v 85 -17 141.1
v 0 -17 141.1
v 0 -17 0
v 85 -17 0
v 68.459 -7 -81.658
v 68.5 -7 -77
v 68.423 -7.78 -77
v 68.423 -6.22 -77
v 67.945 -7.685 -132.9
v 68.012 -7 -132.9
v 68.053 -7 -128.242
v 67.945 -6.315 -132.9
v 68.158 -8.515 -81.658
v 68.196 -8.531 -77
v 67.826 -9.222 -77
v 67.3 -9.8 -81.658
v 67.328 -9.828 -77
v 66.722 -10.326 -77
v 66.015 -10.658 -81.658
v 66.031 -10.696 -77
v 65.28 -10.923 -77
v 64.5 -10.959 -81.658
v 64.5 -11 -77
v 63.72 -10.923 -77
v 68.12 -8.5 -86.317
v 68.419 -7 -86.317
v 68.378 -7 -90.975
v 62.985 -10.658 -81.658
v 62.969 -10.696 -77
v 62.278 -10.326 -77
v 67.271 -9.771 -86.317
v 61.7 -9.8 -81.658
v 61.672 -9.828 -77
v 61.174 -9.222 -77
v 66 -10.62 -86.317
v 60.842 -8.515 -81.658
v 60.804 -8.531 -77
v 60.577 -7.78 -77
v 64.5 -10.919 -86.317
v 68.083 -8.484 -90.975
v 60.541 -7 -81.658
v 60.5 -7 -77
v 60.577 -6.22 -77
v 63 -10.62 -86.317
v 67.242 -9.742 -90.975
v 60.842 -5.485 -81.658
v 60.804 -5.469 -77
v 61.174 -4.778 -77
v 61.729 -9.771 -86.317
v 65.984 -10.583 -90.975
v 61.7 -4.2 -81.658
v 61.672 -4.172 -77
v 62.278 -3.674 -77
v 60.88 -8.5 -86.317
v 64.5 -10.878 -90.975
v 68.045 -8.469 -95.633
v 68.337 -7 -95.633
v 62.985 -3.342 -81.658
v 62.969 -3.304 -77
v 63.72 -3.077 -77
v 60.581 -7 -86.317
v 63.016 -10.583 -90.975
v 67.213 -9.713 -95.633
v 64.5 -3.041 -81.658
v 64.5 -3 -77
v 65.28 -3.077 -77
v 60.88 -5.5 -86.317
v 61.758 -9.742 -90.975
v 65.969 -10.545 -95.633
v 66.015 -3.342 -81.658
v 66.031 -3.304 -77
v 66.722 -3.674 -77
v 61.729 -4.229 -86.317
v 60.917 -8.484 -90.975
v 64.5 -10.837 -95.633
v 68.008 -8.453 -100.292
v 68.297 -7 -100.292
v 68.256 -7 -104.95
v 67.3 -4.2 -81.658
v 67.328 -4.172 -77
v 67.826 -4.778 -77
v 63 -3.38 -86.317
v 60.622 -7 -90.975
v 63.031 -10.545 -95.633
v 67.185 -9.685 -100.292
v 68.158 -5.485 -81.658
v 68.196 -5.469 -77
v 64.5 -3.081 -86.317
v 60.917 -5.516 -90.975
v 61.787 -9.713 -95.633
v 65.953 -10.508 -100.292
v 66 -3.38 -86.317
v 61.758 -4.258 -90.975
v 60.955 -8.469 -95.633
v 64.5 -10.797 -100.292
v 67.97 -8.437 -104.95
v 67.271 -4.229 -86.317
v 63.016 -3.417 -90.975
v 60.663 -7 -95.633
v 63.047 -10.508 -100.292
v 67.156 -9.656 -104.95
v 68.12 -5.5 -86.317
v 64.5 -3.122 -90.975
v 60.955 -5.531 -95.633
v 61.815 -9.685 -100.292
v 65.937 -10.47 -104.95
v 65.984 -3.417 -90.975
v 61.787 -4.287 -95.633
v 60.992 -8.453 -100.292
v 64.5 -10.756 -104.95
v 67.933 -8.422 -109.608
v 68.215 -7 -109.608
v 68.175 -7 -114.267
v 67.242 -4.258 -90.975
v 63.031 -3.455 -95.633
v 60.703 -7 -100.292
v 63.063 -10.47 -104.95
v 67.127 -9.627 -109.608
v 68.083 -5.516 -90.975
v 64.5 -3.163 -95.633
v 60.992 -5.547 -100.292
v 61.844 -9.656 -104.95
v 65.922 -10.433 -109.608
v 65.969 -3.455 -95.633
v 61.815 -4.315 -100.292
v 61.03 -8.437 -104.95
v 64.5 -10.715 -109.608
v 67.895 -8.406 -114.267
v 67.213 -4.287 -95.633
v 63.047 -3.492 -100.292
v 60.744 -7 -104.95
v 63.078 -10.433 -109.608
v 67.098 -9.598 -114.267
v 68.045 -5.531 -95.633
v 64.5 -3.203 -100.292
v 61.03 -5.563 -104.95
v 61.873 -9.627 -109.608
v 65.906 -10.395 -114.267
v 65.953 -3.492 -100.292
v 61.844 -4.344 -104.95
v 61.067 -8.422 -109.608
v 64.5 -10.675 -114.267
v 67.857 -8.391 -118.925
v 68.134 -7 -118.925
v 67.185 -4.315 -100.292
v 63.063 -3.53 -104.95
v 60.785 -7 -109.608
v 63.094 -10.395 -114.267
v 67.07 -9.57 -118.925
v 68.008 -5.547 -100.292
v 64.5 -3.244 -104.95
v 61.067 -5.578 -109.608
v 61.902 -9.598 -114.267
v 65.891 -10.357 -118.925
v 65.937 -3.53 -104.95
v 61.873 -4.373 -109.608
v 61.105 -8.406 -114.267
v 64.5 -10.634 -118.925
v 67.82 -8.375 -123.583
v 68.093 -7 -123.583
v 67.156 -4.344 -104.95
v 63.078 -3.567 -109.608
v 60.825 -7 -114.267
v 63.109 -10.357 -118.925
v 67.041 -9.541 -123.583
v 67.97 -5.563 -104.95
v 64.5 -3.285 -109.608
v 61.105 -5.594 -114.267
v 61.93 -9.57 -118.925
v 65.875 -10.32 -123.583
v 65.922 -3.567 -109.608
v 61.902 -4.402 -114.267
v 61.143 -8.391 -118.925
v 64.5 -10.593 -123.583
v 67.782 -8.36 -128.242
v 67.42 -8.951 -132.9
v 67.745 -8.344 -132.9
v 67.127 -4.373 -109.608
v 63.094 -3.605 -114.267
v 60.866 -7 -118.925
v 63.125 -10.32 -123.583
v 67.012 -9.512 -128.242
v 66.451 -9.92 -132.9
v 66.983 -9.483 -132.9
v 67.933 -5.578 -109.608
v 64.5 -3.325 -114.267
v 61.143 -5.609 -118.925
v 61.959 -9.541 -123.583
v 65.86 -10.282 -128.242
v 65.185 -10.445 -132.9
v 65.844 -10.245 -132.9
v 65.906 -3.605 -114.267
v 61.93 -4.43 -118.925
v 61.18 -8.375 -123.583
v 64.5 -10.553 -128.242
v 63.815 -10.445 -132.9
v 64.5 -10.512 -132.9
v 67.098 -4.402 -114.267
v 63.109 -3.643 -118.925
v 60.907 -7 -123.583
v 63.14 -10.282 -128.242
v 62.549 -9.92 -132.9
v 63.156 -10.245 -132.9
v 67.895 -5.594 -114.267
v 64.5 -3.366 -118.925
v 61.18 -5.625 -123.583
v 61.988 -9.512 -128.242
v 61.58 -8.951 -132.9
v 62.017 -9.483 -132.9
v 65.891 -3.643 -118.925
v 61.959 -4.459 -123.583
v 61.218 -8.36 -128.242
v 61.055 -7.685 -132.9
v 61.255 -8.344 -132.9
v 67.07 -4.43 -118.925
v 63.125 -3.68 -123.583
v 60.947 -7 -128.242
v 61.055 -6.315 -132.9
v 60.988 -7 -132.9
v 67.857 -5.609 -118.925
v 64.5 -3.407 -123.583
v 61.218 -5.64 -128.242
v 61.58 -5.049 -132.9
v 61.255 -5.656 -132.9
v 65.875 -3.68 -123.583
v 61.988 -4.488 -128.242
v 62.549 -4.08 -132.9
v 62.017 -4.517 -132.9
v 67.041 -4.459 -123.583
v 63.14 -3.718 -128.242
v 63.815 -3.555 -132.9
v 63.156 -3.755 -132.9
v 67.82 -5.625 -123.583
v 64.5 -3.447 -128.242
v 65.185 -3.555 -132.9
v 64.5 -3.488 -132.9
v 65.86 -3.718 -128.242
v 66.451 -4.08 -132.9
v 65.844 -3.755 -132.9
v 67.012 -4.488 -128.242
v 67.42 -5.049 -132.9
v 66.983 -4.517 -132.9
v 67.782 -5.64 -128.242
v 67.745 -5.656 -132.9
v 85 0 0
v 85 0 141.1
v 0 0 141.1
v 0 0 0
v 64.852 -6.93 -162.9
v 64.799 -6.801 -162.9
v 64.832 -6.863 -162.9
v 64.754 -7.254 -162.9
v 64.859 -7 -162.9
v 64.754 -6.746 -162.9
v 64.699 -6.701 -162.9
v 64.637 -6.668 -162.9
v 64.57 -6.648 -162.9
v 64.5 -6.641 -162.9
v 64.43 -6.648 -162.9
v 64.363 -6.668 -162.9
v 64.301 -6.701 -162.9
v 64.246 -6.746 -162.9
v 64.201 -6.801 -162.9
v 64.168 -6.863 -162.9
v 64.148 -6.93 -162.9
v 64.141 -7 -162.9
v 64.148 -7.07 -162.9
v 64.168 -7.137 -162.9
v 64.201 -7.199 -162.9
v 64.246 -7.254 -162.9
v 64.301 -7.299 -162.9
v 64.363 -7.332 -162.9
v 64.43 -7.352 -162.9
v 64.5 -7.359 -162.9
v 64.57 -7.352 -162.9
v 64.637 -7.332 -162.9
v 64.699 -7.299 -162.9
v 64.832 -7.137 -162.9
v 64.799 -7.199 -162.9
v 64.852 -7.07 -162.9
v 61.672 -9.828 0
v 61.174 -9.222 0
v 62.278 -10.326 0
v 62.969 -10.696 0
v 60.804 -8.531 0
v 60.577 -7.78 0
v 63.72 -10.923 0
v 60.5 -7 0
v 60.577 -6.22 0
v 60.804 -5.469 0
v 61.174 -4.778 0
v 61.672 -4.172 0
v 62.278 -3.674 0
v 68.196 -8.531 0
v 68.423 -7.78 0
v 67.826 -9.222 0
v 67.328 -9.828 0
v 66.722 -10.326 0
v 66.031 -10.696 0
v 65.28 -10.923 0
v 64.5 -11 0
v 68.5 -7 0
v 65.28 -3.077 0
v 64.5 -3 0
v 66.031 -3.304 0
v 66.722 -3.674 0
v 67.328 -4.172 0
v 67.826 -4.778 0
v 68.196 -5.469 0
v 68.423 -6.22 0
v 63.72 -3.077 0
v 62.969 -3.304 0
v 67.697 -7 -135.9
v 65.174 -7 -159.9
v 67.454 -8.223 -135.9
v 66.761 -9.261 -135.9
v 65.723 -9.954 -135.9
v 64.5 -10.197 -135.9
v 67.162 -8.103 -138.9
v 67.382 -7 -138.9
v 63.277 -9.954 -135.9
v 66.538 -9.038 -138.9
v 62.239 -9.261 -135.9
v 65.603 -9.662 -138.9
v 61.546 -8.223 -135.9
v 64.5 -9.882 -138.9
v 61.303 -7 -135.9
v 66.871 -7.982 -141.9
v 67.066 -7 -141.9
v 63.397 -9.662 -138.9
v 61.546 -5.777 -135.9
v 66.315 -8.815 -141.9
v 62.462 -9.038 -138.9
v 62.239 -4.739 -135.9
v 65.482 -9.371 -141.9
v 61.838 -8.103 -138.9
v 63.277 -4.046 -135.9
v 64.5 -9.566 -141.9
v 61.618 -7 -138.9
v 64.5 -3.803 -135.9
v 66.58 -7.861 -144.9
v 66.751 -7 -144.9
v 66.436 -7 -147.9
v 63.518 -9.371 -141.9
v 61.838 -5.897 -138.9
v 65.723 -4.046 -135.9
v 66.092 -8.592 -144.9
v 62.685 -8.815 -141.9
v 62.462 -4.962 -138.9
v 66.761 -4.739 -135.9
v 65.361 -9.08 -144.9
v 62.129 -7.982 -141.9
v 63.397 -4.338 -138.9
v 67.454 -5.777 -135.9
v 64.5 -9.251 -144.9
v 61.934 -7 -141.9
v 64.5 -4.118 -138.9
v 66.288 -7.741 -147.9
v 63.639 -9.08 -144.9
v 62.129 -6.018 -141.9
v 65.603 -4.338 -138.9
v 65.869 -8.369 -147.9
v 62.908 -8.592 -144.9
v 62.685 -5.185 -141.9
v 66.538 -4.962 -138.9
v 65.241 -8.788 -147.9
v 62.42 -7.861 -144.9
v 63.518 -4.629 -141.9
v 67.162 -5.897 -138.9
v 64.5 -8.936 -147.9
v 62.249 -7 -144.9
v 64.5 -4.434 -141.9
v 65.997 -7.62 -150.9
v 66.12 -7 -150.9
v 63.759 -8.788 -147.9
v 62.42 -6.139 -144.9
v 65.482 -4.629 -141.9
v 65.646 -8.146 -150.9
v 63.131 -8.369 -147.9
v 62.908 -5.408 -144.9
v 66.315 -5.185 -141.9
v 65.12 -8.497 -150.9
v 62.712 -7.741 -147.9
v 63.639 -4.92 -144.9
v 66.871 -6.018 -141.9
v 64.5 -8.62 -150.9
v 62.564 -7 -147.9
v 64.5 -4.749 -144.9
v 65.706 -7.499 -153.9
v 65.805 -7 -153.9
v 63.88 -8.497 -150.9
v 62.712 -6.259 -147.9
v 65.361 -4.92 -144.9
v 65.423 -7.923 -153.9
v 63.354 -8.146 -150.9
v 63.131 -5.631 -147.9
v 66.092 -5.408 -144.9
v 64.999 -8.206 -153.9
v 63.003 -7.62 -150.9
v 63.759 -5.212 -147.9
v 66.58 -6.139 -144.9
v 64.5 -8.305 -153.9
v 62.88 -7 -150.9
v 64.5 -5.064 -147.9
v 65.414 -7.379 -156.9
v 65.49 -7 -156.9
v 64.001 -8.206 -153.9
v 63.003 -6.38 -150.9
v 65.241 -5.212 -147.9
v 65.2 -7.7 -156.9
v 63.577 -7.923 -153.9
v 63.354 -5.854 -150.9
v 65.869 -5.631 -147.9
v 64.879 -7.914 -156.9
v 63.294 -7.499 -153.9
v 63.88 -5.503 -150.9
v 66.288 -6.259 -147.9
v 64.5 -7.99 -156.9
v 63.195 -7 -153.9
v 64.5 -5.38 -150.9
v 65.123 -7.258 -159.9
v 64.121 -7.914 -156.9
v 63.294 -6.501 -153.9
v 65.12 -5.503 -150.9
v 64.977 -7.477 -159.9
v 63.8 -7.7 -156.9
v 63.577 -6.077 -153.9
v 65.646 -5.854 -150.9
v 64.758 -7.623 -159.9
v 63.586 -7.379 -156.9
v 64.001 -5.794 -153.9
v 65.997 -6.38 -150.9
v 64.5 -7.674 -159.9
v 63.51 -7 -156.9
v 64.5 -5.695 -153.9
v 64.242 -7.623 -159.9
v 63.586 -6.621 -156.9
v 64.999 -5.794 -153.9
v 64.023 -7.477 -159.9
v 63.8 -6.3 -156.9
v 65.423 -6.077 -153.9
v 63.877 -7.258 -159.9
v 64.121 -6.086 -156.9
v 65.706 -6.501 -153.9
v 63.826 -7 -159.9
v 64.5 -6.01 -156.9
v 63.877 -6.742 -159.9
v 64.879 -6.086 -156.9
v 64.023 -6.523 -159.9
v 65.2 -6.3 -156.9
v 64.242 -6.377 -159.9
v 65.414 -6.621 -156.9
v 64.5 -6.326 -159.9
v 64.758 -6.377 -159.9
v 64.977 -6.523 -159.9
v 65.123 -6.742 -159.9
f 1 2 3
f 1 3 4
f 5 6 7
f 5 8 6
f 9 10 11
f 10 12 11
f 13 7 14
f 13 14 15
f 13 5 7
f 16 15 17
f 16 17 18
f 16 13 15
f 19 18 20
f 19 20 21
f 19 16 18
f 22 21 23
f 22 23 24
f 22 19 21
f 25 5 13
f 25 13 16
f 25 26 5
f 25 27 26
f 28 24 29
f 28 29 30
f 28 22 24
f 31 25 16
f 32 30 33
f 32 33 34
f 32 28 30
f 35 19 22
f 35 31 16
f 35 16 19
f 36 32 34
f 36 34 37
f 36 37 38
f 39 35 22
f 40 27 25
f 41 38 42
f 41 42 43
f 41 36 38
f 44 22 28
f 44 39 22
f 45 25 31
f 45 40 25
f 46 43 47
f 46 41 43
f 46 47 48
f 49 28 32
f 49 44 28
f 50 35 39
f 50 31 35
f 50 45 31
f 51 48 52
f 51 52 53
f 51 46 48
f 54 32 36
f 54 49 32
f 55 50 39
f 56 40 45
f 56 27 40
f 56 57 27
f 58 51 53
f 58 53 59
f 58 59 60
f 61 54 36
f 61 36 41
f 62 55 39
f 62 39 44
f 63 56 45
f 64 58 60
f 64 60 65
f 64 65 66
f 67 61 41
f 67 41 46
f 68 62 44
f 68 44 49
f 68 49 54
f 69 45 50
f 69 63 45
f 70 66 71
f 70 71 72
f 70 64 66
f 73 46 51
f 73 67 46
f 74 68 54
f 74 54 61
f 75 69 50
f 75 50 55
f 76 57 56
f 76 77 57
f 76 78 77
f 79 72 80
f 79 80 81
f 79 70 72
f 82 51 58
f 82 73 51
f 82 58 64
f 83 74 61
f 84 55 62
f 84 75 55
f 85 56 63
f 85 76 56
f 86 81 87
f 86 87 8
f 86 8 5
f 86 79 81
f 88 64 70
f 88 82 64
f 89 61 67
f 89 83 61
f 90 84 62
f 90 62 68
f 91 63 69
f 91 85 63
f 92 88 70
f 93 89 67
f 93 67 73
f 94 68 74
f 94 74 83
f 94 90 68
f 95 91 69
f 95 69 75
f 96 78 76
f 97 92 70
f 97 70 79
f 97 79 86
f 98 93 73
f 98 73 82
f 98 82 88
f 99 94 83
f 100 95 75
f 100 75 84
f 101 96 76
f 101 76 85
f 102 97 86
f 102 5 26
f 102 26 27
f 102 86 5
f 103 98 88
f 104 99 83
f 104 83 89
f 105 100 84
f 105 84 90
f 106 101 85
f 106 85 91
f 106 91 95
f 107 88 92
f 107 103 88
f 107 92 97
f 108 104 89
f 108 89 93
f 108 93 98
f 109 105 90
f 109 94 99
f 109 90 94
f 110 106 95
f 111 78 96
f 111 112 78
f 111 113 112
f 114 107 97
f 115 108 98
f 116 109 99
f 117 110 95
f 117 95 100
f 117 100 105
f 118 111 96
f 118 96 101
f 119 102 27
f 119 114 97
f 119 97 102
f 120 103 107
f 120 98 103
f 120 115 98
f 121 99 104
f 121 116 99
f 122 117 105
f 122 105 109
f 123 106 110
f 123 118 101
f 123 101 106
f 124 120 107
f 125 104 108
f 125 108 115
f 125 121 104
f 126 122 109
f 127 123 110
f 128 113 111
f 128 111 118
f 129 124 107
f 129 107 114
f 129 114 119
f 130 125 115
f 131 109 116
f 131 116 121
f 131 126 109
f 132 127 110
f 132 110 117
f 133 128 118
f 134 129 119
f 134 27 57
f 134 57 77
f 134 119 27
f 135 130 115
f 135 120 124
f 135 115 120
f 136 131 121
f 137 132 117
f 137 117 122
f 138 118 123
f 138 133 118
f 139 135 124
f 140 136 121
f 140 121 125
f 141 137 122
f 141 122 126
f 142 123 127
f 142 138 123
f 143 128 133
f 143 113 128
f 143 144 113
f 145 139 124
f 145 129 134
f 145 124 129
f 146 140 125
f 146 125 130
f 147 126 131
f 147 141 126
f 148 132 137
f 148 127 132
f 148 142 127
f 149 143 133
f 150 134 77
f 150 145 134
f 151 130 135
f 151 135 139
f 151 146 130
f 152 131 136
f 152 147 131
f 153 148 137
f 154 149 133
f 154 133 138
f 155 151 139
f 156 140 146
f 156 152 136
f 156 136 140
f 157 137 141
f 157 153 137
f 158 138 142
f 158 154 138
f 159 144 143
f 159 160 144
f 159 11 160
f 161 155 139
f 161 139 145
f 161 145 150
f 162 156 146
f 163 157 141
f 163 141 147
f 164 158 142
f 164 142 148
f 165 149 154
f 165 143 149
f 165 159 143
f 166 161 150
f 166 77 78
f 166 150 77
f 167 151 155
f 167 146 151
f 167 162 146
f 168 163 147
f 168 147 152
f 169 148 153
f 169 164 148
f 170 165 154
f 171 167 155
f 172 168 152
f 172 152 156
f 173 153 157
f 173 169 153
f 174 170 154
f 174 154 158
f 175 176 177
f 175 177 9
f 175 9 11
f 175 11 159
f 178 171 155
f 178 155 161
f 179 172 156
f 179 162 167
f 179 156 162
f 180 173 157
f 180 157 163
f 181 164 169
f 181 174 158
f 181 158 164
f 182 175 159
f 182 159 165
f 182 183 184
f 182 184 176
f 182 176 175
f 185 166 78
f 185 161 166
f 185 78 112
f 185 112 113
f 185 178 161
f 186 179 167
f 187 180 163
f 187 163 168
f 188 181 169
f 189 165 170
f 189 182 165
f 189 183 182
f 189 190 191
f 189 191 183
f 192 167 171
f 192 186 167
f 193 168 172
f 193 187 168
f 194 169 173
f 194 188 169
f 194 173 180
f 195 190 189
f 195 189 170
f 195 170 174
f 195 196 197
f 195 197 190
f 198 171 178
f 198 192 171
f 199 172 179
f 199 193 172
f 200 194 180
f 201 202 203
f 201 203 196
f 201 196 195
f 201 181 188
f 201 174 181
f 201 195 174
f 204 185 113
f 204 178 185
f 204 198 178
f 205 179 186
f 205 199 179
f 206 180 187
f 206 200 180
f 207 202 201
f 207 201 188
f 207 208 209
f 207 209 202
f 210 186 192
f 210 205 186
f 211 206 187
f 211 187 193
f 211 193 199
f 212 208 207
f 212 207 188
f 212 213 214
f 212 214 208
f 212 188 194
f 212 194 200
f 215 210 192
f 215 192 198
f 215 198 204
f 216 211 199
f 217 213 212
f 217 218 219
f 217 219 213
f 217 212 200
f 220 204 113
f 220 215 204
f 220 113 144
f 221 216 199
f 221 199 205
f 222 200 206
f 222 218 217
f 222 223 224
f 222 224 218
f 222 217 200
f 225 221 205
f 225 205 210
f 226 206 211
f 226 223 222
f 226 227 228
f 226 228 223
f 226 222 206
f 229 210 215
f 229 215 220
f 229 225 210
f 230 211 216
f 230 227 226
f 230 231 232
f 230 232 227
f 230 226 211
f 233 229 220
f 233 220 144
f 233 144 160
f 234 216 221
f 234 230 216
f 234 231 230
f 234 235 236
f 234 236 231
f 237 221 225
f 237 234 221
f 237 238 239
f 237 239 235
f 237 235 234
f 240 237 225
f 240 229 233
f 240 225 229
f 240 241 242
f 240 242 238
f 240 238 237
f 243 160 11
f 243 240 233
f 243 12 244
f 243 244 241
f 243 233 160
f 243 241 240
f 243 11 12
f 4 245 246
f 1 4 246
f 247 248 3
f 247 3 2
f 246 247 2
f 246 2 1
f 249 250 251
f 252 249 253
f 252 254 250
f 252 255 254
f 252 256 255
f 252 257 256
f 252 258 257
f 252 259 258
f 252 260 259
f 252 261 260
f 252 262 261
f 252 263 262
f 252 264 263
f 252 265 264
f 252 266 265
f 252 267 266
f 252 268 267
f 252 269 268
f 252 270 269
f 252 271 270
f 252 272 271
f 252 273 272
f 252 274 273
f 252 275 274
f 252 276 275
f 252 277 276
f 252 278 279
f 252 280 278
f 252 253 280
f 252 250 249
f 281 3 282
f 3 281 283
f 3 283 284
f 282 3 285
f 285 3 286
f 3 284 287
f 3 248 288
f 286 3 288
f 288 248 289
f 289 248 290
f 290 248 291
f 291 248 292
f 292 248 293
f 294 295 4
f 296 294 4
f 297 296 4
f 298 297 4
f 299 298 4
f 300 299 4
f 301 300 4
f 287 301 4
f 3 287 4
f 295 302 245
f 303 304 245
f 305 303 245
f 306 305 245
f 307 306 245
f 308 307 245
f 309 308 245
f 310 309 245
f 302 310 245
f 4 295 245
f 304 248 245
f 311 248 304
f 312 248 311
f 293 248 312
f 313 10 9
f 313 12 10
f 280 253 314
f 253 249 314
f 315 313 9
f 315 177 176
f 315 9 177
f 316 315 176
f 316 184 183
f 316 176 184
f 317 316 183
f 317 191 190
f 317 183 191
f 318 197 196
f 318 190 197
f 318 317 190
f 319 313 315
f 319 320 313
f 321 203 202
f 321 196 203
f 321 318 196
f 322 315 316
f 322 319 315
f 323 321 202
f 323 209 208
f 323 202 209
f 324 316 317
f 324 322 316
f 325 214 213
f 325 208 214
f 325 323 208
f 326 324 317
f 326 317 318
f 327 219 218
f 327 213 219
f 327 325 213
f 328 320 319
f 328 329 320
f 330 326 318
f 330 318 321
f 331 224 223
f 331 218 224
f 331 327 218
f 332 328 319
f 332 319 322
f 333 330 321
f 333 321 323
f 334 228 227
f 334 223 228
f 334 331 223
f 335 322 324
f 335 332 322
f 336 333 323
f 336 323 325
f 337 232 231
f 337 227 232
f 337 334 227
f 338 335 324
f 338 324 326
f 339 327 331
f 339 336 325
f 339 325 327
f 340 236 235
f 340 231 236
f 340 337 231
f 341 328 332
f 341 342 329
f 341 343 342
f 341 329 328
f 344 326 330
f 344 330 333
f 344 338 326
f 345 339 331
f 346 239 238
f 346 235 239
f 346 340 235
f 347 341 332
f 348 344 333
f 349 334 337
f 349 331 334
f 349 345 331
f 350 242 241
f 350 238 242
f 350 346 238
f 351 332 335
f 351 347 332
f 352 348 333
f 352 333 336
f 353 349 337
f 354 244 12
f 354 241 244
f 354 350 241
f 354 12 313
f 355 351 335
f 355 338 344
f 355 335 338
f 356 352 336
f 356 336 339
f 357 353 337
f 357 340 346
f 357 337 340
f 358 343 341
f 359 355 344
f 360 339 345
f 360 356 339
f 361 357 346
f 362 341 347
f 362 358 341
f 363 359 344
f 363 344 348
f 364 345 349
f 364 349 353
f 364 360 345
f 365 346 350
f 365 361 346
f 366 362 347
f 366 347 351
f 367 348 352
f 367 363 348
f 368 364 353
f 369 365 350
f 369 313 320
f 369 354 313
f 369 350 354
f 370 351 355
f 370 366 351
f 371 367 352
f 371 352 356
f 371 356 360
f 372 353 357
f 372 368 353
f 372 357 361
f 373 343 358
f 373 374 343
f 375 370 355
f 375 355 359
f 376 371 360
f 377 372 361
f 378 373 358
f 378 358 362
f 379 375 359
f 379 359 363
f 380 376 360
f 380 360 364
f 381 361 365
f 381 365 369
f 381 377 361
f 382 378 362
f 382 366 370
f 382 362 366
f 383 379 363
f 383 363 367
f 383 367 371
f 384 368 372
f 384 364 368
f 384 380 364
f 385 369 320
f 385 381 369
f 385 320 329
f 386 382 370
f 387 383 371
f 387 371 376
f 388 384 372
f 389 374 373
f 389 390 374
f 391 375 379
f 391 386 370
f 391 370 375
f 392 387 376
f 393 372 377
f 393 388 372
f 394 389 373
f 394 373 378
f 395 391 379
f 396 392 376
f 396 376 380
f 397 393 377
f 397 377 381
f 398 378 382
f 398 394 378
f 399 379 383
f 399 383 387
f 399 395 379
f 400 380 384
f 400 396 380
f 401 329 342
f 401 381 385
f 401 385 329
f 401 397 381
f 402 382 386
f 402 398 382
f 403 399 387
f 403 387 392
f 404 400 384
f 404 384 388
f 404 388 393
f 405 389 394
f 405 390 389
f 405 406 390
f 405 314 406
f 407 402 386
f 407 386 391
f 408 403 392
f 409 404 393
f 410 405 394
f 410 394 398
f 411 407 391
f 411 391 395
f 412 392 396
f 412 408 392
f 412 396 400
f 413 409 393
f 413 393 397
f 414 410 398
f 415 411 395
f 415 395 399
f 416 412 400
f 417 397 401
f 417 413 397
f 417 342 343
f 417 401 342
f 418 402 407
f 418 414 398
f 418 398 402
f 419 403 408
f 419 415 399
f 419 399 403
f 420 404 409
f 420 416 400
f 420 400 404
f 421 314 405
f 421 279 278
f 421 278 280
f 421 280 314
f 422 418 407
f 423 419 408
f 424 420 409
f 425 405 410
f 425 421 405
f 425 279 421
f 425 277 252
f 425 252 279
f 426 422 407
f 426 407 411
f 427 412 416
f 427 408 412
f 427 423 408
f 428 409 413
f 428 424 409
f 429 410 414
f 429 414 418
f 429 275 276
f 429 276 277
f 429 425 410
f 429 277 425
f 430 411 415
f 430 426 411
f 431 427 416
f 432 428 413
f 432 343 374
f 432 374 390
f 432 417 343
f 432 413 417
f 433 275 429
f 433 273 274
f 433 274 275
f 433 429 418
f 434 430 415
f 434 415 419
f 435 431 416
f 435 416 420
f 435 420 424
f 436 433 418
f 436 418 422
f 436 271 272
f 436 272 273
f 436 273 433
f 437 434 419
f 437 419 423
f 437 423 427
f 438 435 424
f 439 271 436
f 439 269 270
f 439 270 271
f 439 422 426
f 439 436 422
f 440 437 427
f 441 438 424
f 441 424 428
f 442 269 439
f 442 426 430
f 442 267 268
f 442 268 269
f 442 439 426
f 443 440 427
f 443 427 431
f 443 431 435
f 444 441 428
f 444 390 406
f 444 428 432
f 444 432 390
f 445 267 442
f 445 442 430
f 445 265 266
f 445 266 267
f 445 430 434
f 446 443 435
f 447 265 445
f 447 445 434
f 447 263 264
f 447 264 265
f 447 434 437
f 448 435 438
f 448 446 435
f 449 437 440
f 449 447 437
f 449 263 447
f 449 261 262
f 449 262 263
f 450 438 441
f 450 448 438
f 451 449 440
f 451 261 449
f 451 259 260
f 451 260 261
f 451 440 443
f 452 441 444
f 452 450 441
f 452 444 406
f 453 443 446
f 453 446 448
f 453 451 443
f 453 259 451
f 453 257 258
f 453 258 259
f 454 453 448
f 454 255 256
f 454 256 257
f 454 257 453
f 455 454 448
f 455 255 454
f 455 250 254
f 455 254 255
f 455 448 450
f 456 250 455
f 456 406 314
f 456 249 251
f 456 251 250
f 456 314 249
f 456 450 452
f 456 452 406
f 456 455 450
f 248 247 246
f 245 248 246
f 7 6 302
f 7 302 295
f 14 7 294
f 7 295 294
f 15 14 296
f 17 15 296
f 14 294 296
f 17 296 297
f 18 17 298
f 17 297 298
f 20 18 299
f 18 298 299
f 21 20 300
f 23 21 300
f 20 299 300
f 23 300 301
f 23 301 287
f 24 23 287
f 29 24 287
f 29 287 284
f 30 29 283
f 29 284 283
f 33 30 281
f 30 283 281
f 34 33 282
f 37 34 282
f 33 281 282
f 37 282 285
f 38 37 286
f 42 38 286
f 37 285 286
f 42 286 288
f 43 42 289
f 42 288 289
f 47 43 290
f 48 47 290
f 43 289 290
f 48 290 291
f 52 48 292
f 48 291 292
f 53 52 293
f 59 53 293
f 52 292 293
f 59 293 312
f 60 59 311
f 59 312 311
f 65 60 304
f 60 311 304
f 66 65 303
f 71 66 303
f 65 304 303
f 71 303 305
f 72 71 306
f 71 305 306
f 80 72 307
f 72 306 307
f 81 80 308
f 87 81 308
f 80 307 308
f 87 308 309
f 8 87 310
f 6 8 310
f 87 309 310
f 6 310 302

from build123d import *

# Parameters (mm, degrees)
F0_W     = 85
F0_H     = 141.1
F1_DEPTH = 17
F2_R     = 4
F3_DEPTH = 77
F4_R     = 4
F5_DEPTH = 55.9
F5_TAPER = 0.5
F6_R     = 3.5121680905
F7_DEPTH = 30
F7_TAPER = 6


with BuildPart() as f1:
    # F0 (on Front) → F1 (new body)
    with BuildSketch(Plane.XZ):
        with Locations((42.5, 70.55)):
            Rectangle(F0_W, F0_H)
    extrude(amount=F1_DEPTH)

    # F2 (on face) → F3 (join)
    with BuildSketch(Plane(origin=(0, 0, 0), x_dir=(1, 0, 0), z_dir=(0, 0, -1))):
        with Locations((64.5, 7)):
            Circle(F2_R)
    extrude(amount=F3_DEPTH)

    # F4 (on face) → F5 (join)
    with BuildSketch(Plane(origin=(0, 0, -77), x_dir=(1, 0, 0), z_dir=(0, 0, -1))):
        with Locations((64.5, 7)):
            Circle(F4_R)
    extrude(amount=F5_DEPTH, taper=F5_TAPER)

    # F6 (on face) → F7 (join)
    with BuildSketch(Plane(origin=(0, 0, -132.9), x_dir=(1, 0, 0), z_dir=(0, 0, -1))):
        with Locations((64.5, 7)):
            Circle(F6_R)
    extrude(amount=F7_DEPTH, taper=F7_TAPER)


solid = f1.part
